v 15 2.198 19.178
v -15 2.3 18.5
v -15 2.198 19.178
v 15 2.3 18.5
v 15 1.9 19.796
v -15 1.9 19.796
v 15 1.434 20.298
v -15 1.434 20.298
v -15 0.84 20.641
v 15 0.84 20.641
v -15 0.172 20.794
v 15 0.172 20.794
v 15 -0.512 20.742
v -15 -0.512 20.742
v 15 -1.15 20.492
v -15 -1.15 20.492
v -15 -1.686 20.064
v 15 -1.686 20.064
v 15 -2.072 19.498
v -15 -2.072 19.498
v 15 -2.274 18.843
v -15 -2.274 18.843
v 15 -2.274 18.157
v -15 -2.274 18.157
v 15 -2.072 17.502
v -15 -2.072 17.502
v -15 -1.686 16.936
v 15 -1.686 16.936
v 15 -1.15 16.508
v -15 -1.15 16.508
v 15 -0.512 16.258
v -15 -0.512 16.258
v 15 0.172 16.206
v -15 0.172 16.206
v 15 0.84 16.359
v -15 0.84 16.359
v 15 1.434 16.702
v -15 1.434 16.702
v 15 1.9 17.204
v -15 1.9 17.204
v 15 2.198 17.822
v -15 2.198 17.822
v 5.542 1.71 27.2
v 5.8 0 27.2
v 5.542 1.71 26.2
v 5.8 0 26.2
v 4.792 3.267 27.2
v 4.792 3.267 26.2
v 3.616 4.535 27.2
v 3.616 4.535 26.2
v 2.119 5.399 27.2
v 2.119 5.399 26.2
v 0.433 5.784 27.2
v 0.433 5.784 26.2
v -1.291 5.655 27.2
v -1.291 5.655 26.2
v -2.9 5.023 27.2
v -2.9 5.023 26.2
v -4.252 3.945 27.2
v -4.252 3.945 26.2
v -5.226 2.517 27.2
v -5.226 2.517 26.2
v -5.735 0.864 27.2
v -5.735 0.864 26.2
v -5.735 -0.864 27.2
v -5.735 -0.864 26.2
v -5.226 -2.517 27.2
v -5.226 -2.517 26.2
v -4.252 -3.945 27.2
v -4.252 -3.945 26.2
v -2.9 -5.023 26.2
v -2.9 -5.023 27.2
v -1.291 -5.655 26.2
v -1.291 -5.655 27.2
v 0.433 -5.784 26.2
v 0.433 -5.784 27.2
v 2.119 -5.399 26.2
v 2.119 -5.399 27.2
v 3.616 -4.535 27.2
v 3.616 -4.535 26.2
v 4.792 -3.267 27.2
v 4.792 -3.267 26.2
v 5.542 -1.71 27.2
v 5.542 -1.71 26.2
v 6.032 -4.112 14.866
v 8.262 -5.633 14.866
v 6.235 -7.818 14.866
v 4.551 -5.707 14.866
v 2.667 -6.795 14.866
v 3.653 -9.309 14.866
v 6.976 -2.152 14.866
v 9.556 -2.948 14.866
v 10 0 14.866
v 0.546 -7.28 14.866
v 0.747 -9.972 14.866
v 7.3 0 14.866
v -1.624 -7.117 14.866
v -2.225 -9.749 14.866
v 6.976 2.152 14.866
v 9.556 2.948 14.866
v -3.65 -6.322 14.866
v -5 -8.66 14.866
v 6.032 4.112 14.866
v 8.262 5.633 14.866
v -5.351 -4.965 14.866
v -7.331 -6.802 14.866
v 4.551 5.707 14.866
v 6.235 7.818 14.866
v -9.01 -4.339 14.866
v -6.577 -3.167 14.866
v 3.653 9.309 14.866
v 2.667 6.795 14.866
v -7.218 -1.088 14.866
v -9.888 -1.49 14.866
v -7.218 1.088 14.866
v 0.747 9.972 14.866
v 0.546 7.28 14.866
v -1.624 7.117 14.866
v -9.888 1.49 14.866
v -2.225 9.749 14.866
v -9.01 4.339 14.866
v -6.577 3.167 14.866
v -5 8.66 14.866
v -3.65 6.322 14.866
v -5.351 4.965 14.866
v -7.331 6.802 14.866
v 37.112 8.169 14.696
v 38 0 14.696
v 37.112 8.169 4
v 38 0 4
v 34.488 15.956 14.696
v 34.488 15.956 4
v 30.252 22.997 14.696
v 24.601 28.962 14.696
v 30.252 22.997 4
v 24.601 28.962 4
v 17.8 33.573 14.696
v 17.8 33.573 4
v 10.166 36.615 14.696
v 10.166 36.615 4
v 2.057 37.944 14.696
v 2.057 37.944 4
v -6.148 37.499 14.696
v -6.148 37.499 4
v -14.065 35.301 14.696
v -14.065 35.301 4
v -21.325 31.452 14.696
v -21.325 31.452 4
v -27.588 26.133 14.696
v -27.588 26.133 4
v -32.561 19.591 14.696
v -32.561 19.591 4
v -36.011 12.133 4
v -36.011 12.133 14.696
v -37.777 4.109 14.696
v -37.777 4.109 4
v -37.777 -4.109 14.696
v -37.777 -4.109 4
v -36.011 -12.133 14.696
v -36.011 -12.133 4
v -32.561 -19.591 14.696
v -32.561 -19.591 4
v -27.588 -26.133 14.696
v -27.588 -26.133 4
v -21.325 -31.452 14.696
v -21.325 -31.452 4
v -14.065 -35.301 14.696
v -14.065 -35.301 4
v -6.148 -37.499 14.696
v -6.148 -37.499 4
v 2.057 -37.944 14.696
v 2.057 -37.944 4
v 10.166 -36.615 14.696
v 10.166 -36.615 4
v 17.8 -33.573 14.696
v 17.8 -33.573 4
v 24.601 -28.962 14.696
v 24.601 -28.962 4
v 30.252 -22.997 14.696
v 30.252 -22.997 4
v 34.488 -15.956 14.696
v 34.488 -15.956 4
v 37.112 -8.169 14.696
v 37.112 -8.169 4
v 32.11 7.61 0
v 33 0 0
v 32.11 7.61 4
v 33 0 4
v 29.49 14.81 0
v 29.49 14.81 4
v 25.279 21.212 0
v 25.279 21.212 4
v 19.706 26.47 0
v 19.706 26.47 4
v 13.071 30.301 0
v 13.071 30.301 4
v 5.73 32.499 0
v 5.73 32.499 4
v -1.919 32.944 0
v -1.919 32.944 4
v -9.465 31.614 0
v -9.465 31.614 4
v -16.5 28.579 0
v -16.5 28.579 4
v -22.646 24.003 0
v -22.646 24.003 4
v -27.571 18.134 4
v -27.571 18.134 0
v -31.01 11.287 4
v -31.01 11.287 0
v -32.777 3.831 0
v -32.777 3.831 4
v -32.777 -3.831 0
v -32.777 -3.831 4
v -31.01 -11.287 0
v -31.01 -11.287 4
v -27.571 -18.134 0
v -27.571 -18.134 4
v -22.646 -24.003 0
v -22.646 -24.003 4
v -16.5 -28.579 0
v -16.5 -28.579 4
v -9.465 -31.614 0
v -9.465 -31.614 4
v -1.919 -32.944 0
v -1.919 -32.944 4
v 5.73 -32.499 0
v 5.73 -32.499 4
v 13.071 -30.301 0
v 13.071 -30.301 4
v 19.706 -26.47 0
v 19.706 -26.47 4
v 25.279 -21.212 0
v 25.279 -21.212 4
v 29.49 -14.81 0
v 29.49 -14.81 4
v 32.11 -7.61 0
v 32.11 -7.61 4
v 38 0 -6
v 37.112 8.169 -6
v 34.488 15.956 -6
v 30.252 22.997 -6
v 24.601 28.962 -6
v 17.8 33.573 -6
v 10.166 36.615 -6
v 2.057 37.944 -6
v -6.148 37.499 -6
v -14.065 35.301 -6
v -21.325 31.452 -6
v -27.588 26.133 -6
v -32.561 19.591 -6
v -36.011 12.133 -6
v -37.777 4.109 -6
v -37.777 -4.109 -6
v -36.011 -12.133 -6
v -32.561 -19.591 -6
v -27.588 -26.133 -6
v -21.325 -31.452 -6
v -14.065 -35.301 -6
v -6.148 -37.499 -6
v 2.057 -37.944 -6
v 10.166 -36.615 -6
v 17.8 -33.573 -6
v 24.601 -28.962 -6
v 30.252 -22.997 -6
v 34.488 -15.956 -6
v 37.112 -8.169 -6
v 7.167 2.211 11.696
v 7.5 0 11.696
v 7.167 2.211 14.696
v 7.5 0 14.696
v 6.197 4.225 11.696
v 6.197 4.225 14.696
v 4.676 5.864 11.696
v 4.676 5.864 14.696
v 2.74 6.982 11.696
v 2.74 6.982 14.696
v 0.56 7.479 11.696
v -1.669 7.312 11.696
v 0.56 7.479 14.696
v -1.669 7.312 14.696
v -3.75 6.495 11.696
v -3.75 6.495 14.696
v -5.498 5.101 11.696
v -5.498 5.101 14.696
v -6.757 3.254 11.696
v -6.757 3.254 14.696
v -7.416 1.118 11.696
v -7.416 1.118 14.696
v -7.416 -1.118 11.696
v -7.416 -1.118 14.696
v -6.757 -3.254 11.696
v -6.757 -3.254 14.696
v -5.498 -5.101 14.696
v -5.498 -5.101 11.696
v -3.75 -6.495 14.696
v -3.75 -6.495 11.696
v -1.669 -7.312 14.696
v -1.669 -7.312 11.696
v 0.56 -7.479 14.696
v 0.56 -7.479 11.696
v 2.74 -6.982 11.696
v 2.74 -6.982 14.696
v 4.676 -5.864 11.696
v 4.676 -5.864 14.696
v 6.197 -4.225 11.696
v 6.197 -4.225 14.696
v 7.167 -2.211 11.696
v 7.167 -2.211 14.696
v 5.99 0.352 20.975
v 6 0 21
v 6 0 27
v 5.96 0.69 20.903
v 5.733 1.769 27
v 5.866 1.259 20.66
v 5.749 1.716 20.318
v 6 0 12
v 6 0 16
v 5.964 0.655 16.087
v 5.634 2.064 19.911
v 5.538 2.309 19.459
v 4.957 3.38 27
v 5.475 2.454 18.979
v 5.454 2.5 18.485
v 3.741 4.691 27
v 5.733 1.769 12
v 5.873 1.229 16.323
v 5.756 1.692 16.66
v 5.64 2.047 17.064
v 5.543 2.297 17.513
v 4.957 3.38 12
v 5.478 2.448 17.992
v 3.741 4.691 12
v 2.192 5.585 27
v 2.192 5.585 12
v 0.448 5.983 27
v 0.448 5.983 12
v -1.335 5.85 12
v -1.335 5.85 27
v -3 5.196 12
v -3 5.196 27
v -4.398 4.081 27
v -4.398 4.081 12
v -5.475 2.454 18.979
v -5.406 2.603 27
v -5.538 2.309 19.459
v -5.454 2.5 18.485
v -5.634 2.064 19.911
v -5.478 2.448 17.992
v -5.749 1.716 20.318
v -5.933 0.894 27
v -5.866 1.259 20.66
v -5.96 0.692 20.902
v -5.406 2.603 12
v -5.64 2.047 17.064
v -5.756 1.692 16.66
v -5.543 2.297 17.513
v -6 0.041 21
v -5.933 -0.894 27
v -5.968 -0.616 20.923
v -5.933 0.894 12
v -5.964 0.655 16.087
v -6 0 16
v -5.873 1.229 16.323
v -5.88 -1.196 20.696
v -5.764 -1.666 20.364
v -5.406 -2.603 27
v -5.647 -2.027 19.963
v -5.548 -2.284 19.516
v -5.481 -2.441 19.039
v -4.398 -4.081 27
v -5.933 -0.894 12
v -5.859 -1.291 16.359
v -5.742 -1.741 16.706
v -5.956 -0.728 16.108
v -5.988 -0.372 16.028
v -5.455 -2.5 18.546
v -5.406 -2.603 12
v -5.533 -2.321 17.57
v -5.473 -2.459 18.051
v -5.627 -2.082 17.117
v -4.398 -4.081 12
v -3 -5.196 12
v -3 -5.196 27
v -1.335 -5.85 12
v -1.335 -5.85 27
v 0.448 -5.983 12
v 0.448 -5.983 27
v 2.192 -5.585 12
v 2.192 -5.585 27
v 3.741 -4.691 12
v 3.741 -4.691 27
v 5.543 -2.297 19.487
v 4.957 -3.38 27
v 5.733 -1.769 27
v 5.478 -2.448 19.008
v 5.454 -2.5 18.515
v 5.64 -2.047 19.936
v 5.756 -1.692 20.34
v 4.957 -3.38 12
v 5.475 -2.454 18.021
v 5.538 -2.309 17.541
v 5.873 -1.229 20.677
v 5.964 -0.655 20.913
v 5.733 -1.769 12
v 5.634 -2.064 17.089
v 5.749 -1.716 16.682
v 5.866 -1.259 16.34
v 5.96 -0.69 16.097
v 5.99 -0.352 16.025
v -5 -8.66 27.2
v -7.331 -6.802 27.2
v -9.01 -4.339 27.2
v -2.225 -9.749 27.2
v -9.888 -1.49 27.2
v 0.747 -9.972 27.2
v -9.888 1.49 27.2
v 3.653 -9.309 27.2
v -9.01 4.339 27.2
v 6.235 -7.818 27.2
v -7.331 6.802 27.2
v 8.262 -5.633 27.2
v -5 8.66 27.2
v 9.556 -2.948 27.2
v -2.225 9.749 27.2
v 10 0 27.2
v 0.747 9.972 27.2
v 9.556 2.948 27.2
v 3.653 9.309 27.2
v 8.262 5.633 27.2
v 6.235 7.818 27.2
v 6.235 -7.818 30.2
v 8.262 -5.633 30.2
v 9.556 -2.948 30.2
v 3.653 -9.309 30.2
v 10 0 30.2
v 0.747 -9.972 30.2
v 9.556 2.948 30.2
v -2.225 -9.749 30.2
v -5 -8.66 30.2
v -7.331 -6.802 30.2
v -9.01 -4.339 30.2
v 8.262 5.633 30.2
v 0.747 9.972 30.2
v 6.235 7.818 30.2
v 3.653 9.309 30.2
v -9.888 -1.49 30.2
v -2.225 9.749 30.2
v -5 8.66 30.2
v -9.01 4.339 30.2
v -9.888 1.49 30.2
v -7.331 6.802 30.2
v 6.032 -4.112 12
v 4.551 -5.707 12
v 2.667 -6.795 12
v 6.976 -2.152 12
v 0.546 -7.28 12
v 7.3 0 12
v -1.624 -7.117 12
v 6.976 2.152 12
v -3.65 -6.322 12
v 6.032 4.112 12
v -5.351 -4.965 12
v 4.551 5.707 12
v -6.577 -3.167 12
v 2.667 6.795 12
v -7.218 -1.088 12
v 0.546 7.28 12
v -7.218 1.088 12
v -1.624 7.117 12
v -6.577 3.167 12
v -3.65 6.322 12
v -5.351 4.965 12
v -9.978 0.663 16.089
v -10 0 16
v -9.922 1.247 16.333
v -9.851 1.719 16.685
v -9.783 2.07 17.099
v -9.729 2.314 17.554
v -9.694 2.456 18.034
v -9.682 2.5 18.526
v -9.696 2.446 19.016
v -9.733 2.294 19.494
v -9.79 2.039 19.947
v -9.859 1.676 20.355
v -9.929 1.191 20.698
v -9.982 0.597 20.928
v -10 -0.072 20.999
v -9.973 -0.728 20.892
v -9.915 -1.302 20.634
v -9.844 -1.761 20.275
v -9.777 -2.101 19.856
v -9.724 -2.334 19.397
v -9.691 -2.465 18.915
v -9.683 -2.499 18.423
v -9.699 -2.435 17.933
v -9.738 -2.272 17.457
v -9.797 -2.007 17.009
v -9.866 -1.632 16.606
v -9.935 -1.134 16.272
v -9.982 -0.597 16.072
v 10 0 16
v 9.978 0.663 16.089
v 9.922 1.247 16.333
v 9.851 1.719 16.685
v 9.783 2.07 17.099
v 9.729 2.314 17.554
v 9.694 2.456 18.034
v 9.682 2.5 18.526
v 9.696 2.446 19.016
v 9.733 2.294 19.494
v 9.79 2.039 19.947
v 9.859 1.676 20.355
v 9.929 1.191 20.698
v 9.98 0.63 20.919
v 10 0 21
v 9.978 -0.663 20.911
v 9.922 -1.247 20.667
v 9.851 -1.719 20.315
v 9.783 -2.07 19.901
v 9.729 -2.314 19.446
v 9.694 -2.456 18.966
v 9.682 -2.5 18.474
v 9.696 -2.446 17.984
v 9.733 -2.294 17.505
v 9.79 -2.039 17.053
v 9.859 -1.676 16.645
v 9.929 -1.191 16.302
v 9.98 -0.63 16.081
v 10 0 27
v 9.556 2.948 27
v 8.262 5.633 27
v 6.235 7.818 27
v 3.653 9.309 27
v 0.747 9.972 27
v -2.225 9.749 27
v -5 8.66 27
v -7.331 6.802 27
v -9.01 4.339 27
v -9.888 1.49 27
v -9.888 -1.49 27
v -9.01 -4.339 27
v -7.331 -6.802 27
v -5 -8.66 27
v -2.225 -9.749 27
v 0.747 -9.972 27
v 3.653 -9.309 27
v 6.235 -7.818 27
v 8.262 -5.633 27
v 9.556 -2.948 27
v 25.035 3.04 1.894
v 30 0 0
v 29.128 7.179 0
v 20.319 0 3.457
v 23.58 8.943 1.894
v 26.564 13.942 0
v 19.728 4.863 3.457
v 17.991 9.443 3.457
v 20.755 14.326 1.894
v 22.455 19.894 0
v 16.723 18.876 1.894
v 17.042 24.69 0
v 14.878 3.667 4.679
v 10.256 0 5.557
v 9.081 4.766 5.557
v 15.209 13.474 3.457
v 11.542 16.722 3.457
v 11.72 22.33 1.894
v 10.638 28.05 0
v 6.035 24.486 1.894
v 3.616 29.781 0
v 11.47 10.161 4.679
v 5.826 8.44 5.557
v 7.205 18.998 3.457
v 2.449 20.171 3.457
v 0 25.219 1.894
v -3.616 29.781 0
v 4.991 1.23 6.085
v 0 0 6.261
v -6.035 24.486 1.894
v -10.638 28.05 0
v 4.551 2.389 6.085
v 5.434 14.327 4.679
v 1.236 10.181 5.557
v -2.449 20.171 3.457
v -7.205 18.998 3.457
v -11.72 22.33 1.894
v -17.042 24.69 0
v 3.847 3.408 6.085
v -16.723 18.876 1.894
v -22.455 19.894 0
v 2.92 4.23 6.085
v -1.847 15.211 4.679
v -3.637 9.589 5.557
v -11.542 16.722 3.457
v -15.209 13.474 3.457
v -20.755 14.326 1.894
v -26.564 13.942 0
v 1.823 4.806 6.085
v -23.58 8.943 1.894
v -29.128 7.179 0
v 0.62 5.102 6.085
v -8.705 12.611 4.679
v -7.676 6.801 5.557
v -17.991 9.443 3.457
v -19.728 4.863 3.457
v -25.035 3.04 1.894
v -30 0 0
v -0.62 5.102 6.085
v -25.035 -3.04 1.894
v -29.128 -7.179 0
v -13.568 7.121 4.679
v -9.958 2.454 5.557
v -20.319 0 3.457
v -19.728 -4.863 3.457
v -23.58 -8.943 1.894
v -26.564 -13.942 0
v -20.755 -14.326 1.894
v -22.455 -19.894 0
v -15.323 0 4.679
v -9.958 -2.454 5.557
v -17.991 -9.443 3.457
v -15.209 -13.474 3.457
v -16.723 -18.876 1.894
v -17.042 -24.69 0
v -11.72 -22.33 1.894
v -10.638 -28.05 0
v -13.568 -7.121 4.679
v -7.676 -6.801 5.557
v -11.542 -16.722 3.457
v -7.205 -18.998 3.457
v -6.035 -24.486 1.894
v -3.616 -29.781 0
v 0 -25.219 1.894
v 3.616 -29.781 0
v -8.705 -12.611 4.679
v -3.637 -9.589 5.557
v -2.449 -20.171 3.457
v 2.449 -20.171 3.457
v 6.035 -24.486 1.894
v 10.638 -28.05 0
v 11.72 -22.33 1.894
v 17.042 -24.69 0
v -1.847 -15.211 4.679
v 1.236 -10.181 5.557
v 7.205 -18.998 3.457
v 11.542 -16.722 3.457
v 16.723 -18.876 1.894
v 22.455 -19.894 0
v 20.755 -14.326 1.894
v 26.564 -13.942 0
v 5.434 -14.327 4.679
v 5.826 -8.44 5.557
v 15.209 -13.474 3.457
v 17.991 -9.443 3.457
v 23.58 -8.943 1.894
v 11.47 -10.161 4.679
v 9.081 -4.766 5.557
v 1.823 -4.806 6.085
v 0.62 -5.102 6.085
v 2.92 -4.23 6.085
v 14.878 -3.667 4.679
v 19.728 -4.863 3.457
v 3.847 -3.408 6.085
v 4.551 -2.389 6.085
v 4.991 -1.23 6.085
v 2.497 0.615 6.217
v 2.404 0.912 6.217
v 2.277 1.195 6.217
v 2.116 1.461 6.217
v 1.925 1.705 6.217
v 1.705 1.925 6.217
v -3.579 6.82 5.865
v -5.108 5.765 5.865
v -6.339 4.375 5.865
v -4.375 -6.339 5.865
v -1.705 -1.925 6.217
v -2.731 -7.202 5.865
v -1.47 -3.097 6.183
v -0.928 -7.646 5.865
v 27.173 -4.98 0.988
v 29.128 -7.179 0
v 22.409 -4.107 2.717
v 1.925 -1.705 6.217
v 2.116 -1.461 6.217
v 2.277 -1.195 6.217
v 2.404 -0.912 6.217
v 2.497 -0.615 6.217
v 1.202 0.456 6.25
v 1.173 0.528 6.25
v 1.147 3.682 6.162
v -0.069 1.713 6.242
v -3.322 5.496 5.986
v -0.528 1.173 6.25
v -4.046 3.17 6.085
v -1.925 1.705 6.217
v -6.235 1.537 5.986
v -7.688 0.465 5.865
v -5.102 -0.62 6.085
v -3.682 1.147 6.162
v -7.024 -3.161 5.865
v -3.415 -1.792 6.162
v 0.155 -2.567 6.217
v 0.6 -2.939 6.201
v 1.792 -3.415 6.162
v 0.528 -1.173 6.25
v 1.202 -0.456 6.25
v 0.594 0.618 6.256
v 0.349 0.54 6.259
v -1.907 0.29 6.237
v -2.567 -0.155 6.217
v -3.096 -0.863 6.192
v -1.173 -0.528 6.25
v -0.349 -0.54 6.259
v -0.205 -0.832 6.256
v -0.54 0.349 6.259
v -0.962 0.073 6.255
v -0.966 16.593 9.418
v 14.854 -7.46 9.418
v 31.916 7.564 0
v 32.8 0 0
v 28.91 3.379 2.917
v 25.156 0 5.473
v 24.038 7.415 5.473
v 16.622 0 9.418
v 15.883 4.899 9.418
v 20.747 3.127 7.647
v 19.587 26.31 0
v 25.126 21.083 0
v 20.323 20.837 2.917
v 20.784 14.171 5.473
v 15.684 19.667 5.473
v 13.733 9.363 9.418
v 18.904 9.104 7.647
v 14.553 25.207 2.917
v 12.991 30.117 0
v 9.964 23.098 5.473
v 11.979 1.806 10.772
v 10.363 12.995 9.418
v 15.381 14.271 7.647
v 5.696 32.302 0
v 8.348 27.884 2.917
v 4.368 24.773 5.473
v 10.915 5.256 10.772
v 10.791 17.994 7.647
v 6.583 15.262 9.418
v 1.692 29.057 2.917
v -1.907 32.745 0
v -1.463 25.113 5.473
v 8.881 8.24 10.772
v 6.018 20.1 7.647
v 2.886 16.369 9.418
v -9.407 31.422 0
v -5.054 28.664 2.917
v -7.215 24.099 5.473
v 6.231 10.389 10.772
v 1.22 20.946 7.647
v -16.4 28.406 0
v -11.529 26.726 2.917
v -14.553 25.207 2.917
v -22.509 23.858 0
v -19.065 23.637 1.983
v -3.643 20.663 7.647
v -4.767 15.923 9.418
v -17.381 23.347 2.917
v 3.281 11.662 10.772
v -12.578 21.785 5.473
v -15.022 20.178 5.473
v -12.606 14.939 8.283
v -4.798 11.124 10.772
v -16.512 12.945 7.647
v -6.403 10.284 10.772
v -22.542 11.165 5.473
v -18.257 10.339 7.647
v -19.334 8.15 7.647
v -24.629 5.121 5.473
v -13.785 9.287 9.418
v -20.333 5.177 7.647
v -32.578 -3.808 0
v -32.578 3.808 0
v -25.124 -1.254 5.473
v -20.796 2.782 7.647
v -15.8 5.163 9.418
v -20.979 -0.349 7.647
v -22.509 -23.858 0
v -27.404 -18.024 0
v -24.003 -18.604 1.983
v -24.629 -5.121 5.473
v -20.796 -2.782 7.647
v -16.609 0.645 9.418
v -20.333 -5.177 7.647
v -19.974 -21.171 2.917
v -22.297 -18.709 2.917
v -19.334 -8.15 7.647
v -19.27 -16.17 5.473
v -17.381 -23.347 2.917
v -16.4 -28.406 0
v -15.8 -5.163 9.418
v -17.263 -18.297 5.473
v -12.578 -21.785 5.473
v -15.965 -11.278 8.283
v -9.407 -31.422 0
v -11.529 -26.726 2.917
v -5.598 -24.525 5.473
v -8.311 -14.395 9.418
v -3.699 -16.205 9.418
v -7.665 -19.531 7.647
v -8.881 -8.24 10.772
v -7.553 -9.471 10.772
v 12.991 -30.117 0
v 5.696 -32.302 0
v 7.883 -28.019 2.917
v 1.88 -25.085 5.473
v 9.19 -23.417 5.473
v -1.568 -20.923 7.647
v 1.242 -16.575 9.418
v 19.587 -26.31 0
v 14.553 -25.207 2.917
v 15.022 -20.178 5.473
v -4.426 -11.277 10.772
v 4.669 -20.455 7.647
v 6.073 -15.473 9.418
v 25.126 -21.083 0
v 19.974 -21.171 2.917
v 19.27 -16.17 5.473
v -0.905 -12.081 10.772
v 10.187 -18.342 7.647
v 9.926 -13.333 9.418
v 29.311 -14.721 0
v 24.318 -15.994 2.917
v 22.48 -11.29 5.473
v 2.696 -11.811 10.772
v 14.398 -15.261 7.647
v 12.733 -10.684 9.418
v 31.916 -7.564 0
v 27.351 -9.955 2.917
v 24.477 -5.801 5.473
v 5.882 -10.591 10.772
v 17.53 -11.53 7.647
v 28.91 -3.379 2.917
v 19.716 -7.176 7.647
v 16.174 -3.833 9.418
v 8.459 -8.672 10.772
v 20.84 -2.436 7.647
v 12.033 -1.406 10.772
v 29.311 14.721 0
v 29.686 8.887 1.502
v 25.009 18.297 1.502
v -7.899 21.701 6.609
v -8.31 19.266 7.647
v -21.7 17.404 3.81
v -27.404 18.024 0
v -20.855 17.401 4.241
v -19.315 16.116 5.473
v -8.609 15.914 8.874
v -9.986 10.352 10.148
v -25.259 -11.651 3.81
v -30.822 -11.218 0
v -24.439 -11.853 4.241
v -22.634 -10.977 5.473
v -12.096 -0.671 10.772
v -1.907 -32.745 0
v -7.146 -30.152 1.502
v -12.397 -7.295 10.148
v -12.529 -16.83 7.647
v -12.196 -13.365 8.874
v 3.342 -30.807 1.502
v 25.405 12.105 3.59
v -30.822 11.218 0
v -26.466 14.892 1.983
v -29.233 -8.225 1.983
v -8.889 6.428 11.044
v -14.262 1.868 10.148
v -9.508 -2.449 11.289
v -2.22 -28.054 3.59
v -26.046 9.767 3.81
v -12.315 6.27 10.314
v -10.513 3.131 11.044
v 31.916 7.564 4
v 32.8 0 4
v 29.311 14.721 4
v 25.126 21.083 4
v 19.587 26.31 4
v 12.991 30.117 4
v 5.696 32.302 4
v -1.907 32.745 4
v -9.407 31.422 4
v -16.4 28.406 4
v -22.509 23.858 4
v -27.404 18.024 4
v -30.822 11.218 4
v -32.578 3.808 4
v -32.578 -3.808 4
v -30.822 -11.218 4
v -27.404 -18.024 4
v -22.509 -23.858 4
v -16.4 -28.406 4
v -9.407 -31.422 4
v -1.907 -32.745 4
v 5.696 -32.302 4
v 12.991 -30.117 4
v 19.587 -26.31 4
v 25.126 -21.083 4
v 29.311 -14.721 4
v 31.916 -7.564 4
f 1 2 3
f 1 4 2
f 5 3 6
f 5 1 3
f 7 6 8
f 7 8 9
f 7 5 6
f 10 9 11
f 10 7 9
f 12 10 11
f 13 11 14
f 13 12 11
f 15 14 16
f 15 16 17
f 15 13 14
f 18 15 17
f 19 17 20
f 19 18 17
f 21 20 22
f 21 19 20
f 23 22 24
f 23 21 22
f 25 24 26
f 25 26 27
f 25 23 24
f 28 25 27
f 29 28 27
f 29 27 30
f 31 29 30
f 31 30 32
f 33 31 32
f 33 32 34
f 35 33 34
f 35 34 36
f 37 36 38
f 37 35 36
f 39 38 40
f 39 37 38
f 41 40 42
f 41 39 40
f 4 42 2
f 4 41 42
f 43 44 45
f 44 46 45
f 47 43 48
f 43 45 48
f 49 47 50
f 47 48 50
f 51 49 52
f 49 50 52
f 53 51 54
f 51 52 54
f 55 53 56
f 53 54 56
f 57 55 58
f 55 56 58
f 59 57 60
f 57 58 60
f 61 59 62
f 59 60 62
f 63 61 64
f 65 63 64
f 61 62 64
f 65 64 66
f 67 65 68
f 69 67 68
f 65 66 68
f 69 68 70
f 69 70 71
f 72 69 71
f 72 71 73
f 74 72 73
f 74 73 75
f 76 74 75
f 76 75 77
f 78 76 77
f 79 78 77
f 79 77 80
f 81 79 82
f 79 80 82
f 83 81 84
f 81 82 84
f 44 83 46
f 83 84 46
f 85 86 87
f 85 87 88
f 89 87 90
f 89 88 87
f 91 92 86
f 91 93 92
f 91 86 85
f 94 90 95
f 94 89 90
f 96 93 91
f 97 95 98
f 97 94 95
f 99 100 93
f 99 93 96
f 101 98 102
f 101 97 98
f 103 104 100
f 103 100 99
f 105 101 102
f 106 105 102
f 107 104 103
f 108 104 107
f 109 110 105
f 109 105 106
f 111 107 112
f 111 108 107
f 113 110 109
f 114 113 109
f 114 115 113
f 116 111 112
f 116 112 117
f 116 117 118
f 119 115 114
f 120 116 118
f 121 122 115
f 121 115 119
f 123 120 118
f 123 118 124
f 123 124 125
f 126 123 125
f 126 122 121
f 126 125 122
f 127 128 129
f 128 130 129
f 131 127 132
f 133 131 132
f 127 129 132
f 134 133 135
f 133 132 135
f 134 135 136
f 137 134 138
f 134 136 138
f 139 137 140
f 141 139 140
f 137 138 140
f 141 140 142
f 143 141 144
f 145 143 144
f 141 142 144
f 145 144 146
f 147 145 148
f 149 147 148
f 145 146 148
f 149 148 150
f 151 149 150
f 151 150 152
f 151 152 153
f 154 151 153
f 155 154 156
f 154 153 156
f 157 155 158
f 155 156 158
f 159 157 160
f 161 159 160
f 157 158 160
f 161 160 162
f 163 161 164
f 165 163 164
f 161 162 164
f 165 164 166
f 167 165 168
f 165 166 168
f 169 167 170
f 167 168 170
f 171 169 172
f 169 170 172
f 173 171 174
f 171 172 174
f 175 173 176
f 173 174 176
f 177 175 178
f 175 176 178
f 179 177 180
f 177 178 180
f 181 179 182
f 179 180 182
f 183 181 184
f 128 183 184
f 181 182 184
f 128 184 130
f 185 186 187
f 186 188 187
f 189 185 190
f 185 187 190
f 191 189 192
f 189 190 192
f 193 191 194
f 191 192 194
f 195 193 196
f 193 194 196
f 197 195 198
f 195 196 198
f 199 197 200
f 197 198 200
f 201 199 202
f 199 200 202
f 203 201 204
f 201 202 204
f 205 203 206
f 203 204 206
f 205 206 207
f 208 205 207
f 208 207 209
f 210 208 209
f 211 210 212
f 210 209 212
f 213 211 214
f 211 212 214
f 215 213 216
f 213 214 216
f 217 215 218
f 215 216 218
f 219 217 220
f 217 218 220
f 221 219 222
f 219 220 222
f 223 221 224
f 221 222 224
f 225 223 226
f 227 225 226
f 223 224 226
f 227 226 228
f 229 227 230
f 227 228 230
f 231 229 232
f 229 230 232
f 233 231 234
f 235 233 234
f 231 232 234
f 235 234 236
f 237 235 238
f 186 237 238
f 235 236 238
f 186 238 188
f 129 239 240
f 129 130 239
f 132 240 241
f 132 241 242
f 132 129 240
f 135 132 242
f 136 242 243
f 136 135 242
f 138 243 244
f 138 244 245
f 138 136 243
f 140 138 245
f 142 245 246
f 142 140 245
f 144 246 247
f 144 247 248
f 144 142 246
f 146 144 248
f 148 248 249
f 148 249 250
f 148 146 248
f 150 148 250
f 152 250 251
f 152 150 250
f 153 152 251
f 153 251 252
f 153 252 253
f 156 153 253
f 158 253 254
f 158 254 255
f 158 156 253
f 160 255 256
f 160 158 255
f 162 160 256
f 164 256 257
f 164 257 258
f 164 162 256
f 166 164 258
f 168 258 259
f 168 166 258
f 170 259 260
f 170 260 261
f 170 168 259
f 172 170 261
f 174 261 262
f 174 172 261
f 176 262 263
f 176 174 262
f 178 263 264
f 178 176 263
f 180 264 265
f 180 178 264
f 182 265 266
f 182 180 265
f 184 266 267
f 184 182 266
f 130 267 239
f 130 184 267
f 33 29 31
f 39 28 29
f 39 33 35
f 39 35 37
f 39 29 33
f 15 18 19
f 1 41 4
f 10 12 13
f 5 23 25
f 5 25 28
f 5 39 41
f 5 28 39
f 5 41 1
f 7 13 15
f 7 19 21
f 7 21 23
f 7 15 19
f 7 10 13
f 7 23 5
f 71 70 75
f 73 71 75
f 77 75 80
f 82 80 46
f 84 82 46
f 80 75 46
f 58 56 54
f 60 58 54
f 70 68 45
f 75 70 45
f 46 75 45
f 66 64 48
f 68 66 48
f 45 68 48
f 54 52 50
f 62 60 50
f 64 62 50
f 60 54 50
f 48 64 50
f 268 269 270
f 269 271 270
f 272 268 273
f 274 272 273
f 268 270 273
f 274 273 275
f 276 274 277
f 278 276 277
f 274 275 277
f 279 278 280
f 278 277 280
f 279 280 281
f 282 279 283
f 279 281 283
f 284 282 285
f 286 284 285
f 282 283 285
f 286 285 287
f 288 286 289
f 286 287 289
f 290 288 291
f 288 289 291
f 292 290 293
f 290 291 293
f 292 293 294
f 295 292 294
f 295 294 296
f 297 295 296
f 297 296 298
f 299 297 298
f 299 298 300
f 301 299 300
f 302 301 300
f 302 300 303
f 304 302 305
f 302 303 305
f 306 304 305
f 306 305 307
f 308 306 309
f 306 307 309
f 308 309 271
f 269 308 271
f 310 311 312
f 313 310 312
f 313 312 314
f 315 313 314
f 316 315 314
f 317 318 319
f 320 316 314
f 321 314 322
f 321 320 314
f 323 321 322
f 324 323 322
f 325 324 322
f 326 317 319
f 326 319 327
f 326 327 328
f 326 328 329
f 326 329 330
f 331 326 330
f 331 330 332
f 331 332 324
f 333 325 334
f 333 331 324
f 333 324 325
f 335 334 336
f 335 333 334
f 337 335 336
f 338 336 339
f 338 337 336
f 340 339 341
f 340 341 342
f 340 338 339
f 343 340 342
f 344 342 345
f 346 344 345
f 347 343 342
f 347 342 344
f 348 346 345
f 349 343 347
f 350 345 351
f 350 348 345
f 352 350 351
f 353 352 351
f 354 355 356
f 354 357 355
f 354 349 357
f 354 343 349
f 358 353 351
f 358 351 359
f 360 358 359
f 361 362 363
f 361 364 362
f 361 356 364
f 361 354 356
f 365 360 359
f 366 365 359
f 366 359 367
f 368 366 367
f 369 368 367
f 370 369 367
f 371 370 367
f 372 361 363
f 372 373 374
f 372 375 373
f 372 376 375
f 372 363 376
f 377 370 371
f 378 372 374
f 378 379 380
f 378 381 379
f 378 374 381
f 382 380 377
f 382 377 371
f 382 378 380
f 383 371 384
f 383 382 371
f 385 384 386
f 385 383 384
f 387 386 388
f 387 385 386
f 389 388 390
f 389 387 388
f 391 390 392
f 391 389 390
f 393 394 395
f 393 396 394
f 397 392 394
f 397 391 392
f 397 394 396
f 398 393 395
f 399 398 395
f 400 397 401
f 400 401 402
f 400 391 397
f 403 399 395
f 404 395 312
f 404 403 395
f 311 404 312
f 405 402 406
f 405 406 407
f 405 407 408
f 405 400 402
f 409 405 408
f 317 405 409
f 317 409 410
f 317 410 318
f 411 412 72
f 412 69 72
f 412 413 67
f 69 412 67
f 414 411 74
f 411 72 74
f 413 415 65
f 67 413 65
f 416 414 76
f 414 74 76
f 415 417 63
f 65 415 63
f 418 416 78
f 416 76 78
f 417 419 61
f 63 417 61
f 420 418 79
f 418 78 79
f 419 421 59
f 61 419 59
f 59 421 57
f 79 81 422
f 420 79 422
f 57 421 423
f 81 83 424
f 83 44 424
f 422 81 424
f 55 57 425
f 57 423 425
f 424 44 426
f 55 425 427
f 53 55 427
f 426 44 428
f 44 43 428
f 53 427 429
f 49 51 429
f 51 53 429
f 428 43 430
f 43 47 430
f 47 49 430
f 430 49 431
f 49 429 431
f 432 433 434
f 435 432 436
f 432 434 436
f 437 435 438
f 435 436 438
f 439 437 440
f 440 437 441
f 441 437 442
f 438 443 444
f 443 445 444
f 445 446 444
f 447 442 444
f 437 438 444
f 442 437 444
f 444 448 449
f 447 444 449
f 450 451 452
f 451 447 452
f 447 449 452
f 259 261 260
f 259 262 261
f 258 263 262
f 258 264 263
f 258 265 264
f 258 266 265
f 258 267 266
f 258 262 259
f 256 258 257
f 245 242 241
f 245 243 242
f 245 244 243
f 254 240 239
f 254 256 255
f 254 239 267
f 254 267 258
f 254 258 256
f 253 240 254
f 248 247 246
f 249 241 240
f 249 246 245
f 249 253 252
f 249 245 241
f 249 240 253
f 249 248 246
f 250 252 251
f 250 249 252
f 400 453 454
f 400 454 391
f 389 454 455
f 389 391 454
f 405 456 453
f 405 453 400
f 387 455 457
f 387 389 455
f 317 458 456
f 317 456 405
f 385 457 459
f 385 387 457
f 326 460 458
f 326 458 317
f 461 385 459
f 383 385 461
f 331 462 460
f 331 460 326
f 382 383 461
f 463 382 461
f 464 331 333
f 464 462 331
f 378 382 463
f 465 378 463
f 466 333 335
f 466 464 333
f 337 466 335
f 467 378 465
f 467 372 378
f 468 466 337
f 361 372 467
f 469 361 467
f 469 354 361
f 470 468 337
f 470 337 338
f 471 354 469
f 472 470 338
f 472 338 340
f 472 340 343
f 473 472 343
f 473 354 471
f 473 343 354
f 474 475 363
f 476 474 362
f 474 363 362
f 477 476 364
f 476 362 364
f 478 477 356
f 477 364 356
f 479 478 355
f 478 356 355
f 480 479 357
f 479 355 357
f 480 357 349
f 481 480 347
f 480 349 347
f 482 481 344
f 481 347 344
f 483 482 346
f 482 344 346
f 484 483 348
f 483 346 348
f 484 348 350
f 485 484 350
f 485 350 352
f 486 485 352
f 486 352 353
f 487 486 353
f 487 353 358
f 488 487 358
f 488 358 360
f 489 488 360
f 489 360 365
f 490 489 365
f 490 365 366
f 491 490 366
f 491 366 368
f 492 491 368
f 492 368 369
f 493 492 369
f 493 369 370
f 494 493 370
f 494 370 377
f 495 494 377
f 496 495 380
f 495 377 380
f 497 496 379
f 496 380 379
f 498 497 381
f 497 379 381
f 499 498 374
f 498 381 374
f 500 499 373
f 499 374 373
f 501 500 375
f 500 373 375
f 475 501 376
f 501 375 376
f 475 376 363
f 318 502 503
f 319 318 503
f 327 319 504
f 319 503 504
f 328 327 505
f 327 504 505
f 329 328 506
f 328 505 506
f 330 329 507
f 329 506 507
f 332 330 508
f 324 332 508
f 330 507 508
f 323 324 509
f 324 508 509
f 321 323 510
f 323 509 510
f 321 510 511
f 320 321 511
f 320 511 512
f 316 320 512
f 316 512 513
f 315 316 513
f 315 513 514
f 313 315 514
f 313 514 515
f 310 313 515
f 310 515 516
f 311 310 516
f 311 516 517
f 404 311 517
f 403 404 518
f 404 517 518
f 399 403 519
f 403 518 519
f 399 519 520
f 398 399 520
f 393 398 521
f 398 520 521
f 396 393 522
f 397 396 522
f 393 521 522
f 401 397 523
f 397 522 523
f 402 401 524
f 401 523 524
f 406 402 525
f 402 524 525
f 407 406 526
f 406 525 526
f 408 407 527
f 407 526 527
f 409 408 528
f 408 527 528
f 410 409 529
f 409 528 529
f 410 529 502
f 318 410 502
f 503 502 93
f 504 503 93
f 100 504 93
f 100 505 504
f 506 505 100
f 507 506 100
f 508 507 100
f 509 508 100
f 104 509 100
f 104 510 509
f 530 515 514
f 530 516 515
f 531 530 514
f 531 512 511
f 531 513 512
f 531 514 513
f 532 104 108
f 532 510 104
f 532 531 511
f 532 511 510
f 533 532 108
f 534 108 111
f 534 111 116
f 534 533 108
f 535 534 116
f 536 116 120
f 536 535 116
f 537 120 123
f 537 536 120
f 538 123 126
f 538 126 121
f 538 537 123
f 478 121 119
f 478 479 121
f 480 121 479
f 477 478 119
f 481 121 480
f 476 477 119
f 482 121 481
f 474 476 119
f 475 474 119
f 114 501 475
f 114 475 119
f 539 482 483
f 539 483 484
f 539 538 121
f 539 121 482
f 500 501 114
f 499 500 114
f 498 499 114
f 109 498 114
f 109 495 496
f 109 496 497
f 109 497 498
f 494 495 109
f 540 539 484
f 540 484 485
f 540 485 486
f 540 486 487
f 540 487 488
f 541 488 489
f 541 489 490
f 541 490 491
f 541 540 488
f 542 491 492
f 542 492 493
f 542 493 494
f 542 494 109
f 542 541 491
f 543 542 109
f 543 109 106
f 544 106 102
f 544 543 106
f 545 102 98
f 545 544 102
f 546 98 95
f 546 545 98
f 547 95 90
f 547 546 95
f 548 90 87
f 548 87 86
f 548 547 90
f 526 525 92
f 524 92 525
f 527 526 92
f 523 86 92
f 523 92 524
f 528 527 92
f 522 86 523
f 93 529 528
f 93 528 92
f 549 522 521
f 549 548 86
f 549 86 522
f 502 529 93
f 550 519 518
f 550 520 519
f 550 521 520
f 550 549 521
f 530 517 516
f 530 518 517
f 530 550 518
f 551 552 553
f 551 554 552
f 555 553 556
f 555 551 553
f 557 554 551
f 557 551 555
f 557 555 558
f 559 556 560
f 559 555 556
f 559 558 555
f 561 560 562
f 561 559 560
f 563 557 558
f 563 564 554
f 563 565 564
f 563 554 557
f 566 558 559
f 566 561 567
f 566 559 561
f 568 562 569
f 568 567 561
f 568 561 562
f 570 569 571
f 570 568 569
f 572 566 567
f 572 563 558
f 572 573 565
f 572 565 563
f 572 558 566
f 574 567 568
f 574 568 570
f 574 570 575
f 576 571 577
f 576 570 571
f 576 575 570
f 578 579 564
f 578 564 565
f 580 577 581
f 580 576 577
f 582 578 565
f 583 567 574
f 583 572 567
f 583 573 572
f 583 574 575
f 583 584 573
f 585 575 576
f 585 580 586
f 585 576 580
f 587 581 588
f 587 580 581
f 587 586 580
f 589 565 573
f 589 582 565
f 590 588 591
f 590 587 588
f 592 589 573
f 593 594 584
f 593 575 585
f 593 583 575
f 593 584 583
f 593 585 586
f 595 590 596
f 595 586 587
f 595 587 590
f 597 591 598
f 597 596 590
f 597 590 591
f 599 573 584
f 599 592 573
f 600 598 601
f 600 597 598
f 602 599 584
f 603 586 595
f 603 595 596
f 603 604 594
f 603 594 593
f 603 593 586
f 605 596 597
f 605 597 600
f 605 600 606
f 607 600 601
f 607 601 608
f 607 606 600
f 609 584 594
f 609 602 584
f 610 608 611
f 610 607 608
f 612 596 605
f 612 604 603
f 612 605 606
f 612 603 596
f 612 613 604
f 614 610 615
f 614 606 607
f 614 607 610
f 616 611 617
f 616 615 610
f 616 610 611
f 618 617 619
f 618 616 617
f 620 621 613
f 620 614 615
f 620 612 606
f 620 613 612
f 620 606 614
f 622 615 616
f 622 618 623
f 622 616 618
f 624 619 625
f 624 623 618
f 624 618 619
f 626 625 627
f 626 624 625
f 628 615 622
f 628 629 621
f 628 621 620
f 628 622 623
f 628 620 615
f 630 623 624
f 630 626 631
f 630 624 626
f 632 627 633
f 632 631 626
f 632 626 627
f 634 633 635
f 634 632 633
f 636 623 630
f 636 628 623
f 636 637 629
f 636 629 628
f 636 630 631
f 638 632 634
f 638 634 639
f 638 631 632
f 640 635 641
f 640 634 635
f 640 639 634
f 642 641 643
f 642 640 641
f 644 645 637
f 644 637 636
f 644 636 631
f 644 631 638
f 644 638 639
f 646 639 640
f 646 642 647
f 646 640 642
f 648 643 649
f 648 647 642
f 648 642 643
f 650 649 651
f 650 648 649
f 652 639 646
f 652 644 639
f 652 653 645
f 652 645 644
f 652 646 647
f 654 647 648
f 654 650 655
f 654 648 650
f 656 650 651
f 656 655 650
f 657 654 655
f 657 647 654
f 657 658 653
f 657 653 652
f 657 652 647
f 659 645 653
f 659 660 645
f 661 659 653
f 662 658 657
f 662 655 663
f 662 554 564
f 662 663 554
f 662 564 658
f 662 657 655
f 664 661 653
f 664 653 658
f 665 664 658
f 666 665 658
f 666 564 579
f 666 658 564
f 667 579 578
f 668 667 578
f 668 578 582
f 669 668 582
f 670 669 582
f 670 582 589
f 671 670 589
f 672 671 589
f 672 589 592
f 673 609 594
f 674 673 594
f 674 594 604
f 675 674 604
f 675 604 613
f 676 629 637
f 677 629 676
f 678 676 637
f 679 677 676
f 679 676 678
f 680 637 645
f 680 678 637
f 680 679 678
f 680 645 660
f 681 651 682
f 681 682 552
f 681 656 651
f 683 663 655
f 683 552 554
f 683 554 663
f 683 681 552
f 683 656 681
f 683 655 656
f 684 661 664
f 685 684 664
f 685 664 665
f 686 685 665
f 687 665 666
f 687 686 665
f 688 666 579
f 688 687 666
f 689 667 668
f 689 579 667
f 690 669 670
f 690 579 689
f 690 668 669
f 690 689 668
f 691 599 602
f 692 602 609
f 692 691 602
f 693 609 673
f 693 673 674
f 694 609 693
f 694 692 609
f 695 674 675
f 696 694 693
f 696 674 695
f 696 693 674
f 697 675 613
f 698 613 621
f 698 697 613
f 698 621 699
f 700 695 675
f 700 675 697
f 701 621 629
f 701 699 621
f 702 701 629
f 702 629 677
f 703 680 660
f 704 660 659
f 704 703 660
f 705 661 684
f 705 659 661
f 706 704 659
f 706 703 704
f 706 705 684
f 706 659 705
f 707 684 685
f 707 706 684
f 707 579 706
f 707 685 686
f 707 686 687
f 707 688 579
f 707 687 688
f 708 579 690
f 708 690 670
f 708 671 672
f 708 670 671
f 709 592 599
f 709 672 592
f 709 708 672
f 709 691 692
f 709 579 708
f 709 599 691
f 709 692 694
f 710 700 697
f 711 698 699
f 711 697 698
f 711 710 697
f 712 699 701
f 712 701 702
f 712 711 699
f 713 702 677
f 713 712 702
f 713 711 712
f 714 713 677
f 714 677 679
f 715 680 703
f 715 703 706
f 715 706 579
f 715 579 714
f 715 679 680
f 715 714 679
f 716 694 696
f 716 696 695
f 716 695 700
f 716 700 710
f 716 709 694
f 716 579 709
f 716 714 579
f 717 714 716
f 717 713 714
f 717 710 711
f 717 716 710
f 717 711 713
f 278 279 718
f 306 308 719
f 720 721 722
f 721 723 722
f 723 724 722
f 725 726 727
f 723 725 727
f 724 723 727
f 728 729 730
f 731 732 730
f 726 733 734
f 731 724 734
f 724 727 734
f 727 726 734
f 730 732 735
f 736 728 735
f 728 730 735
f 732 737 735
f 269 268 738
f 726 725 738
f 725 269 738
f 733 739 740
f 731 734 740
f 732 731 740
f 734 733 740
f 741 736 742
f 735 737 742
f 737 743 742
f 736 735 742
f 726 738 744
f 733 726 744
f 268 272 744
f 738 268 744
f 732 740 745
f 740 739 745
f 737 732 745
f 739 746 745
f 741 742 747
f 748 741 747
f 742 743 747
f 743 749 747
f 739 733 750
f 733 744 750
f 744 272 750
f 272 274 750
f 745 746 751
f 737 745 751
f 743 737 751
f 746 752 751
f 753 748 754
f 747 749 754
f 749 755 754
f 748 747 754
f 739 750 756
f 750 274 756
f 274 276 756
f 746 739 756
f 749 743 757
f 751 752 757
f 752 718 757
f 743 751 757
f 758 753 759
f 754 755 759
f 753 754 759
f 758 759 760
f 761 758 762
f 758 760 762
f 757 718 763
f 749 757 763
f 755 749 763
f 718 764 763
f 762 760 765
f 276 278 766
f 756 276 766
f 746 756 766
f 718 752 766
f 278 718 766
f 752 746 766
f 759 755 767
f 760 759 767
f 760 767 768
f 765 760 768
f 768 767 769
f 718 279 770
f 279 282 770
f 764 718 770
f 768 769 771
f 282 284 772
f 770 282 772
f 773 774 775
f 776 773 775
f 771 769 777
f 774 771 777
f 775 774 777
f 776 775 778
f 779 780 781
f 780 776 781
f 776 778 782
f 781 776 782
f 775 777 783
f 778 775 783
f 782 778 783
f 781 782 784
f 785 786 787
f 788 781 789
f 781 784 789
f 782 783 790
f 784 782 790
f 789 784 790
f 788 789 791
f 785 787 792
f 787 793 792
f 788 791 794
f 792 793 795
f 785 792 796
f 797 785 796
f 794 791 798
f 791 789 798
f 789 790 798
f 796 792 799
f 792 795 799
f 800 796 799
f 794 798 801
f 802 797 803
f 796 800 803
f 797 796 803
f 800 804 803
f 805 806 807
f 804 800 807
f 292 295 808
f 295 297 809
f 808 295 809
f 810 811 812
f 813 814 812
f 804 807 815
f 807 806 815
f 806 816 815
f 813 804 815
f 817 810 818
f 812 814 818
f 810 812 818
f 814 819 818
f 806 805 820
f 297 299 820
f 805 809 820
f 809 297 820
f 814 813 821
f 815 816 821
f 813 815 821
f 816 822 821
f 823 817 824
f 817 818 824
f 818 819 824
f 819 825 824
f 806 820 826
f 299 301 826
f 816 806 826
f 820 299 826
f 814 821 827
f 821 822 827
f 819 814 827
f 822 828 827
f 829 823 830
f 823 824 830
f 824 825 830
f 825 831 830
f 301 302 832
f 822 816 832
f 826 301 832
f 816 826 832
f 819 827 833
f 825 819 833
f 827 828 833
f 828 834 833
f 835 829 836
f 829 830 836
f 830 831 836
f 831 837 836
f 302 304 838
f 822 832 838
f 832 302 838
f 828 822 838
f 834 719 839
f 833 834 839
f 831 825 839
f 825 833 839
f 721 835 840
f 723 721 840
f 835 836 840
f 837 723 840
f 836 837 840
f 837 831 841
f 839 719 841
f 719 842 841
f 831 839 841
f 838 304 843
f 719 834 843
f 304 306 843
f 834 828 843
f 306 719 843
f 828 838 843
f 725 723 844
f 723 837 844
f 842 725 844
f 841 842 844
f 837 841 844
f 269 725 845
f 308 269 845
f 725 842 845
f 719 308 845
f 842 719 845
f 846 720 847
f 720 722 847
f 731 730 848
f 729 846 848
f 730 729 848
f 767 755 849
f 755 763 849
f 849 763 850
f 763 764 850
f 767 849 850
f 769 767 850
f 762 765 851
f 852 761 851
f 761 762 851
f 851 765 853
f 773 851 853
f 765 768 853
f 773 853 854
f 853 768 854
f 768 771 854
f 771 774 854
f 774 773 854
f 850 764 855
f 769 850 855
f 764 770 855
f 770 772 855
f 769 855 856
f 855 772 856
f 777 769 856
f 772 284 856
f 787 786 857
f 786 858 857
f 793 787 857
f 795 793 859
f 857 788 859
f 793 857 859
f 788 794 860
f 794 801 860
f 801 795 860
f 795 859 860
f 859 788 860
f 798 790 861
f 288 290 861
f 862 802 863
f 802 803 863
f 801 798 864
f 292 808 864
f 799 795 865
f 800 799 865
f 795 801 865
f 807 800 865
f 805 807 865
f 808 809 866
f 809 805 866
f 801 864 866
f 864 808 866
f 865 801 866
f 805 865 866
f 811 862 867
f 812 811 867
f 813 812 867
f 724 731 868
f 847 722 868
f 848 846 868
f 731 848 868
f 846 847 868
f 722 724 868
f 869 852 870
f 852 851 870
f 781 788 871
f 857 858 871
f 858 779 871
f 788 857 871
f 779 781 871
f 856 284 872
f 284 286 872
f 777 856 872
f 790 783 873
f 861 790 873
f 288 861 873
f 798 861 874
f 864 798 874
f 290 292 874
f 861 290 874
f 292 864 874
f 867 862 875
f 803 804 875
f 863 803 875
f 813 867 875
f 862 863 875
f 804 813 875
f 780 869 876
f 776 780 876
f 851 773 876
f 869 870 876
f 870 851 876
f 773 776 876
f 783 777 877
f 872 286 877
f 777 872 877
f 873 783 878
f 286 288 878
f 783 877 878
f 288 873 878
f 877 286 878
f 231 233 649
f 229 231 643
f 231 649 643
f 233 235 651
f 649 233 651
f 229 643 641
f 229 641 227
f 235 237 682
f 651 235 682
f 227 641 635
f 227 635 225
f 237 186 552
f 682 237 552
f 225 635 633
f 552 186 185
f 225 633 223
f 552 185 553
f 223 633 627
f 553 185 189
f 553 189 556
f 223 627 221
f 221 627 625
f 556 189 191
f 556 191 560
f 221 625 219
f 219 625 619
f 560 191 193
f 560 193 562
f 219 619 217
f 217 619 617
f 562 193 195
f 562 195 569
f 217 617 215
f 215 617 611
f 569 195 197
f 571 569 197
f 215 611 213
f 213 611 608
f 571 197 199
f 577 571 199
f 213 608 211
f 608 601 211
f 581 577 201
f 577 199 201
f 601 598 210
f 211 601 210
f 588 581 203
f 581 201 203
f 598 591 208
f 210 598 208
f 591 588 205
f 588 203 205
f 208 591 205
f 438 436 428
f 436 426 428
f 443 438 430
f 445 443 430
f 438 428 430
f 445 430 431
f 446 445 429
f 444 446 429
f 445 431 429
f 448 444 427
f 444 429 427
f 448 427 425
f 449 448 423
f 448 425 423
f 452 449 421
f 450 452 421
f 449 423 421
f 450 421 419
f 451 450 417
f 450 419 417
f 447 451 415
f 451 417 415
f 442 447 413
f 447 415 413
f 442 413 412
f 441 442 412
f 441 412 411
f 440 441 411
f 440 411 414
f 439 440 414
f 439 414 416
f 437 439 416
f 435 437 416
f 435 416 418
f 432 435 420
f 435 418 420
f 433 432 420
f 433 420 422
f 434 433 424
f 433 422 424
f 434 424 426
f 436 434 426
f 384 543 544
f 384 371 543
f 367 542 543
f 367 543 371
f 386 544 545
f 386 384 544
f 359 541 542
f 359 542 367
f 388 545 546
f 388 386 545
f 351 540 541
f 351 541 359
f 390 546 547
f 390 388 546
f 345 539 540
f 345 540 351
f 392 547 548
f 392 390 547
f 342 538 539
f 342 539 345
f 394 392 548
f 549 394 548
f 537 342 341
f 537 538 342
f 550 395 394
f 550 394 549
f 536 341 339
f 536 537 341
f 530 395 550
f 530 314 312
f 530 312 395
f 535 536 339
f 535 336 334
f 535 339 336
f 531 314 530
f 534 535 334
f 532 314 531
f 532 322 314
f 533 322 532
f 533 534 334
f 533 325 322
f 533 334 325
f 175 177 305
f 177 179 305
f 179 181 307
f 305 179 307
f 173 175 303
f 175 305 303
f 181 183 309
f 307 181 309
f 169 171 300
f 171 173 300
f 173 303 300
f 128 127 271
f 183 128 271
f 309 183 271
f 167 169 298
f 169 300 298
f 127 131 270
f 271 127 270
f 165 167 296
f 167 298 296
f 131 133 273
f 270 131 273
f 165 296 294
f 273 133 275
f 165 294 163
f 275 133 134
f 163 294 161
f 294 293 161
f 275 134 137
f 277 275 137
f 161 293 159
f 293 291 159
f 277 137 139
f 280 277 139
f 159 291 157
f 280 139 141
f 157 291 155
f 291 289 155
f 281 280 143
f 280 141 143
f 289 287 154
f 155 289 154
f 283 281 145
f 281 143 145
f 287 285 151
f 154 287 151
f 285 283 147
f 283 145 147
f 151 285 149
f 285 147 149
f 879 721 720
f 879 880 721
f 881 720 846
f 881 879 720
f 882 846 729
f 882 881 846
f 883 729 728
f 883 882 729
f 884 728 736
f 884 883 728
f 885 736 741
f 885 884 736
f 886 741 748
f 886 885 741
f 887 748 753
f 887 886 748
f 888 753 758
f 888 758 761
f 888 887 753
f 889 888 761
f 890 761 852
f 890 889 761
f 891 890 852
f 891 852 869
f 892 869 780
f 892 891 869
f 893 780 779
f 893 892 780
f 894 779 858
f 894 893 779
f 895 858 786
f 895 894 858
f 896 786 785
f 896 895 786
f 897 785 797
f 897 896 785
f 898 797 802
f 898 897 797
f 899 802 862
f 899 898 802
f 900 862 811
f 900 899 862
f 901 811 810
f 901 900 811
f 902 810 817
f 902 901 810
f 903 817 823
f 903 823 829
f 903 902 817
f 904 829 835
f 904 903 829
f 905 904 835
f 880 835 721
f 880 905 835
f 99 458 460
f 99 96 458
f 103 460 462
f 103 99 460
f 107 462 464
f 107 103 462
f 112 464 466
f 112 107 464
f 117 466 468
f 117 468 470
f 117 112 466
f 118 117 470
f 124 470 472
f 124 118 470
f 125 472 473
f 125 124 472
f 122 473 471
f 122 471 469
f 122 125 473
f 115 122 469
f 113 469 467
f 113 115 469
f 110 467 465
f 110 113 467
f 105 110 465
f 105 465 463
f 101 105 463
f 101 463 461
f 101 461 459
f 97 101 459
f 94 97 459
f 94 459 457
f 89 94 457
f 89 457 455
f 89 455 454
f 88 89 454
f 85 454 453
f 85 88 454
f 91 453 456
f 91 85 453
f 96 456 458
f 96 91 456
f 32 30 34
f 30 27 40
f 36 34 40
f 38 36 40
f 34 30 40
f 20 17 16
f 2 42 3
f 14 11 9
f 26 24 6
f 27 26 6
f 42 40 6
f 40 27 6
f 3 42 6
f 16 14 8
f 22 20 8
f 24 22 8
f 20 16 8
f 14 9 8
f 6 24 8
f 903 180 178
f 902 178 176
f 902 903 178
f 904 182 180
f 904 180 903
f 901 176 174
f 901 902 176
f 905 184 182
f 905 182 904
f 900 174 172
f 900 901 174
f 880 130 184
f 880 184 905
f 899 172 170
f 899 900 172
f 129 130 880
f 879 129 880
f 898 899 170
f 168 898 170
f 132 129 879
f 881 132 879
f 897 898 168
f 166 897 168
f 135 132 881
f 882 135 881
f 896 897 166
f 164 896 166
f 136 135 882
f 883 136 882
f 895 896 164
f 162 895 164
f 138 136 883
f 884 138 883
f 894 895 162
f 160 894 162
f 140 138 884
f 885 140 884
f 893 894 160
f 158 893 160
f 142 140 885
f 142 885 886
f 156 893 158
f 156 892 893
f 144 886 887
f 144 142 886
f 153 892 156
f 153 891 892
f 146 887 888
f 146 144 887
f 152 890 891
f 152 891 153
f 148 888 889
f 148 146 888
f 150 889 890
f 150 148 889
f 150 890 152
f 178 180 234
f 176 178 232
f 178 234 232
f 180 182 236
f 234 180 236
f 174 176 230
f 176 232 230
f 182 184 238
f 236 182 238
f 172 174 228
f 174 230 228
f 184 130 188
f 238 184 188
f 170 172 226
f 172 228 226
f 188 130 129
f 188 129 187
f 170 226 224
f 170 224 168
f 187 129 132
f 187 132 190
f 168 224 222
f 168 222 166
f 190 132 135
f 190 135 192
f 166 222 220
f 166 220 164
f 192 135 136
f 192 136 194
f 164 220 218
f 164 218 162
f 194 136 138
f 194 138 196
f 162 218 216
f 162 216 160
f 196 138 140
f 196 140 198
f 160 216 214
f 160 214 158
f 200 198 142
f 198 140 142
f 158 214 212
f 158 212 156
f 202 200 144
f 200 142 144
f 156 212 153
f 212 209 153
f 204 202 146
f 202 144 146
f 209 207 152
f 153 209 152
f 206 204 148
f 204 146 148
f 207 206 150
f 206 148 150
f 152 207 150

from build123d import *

# Parameters (mm, degrees)
SKETCH003_R  = 2.5
POCKET_DEPTH = 50
SKETCH004_R  = 2.3
PAD_DEPTH    = 15


with BuildPart() as body:
    # Sketch → Revolution (revolve)
    with BuildSketch(Plane.XZ):
        with BuildLine():
            ThreePointArc((30, 0), (15.323223, 4.679338), (0, 6.261365))
            Line((0, 6.261365), (0, -6))
            Line((0, -6), (38, -6))
            Line((38, -6), (38, 4))
            Line((33, 4), (38, 4))
            Line((33, 0), (33, 4))
            Line((30, 0), (33, 0))
        make_face()
    revolve(axis=Axis((0, 0, 0), (0, 0, 1)))


with BuildPart() as body001:
    # Sketch001 → Revolution001 (revolve)
    with BuildSketch(Plane.XZ):
        with BuildLine():
            ThreePointArc((32.8, 0), (20.981494, 7.646721), (7.5, 11.696255))
            Line((7.5, 11.696255), (7.5, 14.696255))
            Line((7.5, 14.696255), (38, 14.696255))
            Line((38, 14.696255), (38, 4))
            Line((32.8, 4), (38, 4))
            Line((32.8, 0), (32.8, 4))
        make_face()
    revolve(axis=Axis((0, 0, 0), (0, 0, 1)))


with BuildPart() as body002:
    # Sketch002 → Revolution002 (revolve)
    with BuildSketch(Plane.XZ):
        Polygon((6, 27), (6, 12), (7.3, 12), (7.3, 14.86637), (10, 14.86637), (10, 27), align=None)
    revolve(axis=Axis((0, 0, 0), (0, 0, 1)))

    # Sketch003 (on DatumPlane) → Pocket (cut)
    with BuildSketch(Plane(origin=(10, 0, 27), x_dir=(0, 0, -1), z_dir=(1, 0, 0))):
        with Locations((8.5, 0)):
            Circle(SKETCH003_R)
    extrude(amount=-POCKET_DEPTH, mode=Mode.SUBTRACT)


with BuildPart() as body003:
    # Sketch004 → Pad (new body, symmetric)
    with BuildSketch(Plane.YZ):
        with Locations((0, 18.5)):
            Circle(SKETCH004_R)
    extrude(amount=PAD_DEPTH, both=True)


with BuildPart() as body004:
    # Sketch005 → Revolution003 (revolve)
    with BuildSketch(Plane.XZ):
        Polygon((0, 26.2), (0, 30.2), (10, 30.2), (10, 27.2), (5.8, 27.2), (5.8, 26.2), align=None)
    revolve(axis=Axis((0, 0, 0), (0, 0, 1)))


solid = Compound([body.part, body001.part, body002.part, body003.part, body004.part])
